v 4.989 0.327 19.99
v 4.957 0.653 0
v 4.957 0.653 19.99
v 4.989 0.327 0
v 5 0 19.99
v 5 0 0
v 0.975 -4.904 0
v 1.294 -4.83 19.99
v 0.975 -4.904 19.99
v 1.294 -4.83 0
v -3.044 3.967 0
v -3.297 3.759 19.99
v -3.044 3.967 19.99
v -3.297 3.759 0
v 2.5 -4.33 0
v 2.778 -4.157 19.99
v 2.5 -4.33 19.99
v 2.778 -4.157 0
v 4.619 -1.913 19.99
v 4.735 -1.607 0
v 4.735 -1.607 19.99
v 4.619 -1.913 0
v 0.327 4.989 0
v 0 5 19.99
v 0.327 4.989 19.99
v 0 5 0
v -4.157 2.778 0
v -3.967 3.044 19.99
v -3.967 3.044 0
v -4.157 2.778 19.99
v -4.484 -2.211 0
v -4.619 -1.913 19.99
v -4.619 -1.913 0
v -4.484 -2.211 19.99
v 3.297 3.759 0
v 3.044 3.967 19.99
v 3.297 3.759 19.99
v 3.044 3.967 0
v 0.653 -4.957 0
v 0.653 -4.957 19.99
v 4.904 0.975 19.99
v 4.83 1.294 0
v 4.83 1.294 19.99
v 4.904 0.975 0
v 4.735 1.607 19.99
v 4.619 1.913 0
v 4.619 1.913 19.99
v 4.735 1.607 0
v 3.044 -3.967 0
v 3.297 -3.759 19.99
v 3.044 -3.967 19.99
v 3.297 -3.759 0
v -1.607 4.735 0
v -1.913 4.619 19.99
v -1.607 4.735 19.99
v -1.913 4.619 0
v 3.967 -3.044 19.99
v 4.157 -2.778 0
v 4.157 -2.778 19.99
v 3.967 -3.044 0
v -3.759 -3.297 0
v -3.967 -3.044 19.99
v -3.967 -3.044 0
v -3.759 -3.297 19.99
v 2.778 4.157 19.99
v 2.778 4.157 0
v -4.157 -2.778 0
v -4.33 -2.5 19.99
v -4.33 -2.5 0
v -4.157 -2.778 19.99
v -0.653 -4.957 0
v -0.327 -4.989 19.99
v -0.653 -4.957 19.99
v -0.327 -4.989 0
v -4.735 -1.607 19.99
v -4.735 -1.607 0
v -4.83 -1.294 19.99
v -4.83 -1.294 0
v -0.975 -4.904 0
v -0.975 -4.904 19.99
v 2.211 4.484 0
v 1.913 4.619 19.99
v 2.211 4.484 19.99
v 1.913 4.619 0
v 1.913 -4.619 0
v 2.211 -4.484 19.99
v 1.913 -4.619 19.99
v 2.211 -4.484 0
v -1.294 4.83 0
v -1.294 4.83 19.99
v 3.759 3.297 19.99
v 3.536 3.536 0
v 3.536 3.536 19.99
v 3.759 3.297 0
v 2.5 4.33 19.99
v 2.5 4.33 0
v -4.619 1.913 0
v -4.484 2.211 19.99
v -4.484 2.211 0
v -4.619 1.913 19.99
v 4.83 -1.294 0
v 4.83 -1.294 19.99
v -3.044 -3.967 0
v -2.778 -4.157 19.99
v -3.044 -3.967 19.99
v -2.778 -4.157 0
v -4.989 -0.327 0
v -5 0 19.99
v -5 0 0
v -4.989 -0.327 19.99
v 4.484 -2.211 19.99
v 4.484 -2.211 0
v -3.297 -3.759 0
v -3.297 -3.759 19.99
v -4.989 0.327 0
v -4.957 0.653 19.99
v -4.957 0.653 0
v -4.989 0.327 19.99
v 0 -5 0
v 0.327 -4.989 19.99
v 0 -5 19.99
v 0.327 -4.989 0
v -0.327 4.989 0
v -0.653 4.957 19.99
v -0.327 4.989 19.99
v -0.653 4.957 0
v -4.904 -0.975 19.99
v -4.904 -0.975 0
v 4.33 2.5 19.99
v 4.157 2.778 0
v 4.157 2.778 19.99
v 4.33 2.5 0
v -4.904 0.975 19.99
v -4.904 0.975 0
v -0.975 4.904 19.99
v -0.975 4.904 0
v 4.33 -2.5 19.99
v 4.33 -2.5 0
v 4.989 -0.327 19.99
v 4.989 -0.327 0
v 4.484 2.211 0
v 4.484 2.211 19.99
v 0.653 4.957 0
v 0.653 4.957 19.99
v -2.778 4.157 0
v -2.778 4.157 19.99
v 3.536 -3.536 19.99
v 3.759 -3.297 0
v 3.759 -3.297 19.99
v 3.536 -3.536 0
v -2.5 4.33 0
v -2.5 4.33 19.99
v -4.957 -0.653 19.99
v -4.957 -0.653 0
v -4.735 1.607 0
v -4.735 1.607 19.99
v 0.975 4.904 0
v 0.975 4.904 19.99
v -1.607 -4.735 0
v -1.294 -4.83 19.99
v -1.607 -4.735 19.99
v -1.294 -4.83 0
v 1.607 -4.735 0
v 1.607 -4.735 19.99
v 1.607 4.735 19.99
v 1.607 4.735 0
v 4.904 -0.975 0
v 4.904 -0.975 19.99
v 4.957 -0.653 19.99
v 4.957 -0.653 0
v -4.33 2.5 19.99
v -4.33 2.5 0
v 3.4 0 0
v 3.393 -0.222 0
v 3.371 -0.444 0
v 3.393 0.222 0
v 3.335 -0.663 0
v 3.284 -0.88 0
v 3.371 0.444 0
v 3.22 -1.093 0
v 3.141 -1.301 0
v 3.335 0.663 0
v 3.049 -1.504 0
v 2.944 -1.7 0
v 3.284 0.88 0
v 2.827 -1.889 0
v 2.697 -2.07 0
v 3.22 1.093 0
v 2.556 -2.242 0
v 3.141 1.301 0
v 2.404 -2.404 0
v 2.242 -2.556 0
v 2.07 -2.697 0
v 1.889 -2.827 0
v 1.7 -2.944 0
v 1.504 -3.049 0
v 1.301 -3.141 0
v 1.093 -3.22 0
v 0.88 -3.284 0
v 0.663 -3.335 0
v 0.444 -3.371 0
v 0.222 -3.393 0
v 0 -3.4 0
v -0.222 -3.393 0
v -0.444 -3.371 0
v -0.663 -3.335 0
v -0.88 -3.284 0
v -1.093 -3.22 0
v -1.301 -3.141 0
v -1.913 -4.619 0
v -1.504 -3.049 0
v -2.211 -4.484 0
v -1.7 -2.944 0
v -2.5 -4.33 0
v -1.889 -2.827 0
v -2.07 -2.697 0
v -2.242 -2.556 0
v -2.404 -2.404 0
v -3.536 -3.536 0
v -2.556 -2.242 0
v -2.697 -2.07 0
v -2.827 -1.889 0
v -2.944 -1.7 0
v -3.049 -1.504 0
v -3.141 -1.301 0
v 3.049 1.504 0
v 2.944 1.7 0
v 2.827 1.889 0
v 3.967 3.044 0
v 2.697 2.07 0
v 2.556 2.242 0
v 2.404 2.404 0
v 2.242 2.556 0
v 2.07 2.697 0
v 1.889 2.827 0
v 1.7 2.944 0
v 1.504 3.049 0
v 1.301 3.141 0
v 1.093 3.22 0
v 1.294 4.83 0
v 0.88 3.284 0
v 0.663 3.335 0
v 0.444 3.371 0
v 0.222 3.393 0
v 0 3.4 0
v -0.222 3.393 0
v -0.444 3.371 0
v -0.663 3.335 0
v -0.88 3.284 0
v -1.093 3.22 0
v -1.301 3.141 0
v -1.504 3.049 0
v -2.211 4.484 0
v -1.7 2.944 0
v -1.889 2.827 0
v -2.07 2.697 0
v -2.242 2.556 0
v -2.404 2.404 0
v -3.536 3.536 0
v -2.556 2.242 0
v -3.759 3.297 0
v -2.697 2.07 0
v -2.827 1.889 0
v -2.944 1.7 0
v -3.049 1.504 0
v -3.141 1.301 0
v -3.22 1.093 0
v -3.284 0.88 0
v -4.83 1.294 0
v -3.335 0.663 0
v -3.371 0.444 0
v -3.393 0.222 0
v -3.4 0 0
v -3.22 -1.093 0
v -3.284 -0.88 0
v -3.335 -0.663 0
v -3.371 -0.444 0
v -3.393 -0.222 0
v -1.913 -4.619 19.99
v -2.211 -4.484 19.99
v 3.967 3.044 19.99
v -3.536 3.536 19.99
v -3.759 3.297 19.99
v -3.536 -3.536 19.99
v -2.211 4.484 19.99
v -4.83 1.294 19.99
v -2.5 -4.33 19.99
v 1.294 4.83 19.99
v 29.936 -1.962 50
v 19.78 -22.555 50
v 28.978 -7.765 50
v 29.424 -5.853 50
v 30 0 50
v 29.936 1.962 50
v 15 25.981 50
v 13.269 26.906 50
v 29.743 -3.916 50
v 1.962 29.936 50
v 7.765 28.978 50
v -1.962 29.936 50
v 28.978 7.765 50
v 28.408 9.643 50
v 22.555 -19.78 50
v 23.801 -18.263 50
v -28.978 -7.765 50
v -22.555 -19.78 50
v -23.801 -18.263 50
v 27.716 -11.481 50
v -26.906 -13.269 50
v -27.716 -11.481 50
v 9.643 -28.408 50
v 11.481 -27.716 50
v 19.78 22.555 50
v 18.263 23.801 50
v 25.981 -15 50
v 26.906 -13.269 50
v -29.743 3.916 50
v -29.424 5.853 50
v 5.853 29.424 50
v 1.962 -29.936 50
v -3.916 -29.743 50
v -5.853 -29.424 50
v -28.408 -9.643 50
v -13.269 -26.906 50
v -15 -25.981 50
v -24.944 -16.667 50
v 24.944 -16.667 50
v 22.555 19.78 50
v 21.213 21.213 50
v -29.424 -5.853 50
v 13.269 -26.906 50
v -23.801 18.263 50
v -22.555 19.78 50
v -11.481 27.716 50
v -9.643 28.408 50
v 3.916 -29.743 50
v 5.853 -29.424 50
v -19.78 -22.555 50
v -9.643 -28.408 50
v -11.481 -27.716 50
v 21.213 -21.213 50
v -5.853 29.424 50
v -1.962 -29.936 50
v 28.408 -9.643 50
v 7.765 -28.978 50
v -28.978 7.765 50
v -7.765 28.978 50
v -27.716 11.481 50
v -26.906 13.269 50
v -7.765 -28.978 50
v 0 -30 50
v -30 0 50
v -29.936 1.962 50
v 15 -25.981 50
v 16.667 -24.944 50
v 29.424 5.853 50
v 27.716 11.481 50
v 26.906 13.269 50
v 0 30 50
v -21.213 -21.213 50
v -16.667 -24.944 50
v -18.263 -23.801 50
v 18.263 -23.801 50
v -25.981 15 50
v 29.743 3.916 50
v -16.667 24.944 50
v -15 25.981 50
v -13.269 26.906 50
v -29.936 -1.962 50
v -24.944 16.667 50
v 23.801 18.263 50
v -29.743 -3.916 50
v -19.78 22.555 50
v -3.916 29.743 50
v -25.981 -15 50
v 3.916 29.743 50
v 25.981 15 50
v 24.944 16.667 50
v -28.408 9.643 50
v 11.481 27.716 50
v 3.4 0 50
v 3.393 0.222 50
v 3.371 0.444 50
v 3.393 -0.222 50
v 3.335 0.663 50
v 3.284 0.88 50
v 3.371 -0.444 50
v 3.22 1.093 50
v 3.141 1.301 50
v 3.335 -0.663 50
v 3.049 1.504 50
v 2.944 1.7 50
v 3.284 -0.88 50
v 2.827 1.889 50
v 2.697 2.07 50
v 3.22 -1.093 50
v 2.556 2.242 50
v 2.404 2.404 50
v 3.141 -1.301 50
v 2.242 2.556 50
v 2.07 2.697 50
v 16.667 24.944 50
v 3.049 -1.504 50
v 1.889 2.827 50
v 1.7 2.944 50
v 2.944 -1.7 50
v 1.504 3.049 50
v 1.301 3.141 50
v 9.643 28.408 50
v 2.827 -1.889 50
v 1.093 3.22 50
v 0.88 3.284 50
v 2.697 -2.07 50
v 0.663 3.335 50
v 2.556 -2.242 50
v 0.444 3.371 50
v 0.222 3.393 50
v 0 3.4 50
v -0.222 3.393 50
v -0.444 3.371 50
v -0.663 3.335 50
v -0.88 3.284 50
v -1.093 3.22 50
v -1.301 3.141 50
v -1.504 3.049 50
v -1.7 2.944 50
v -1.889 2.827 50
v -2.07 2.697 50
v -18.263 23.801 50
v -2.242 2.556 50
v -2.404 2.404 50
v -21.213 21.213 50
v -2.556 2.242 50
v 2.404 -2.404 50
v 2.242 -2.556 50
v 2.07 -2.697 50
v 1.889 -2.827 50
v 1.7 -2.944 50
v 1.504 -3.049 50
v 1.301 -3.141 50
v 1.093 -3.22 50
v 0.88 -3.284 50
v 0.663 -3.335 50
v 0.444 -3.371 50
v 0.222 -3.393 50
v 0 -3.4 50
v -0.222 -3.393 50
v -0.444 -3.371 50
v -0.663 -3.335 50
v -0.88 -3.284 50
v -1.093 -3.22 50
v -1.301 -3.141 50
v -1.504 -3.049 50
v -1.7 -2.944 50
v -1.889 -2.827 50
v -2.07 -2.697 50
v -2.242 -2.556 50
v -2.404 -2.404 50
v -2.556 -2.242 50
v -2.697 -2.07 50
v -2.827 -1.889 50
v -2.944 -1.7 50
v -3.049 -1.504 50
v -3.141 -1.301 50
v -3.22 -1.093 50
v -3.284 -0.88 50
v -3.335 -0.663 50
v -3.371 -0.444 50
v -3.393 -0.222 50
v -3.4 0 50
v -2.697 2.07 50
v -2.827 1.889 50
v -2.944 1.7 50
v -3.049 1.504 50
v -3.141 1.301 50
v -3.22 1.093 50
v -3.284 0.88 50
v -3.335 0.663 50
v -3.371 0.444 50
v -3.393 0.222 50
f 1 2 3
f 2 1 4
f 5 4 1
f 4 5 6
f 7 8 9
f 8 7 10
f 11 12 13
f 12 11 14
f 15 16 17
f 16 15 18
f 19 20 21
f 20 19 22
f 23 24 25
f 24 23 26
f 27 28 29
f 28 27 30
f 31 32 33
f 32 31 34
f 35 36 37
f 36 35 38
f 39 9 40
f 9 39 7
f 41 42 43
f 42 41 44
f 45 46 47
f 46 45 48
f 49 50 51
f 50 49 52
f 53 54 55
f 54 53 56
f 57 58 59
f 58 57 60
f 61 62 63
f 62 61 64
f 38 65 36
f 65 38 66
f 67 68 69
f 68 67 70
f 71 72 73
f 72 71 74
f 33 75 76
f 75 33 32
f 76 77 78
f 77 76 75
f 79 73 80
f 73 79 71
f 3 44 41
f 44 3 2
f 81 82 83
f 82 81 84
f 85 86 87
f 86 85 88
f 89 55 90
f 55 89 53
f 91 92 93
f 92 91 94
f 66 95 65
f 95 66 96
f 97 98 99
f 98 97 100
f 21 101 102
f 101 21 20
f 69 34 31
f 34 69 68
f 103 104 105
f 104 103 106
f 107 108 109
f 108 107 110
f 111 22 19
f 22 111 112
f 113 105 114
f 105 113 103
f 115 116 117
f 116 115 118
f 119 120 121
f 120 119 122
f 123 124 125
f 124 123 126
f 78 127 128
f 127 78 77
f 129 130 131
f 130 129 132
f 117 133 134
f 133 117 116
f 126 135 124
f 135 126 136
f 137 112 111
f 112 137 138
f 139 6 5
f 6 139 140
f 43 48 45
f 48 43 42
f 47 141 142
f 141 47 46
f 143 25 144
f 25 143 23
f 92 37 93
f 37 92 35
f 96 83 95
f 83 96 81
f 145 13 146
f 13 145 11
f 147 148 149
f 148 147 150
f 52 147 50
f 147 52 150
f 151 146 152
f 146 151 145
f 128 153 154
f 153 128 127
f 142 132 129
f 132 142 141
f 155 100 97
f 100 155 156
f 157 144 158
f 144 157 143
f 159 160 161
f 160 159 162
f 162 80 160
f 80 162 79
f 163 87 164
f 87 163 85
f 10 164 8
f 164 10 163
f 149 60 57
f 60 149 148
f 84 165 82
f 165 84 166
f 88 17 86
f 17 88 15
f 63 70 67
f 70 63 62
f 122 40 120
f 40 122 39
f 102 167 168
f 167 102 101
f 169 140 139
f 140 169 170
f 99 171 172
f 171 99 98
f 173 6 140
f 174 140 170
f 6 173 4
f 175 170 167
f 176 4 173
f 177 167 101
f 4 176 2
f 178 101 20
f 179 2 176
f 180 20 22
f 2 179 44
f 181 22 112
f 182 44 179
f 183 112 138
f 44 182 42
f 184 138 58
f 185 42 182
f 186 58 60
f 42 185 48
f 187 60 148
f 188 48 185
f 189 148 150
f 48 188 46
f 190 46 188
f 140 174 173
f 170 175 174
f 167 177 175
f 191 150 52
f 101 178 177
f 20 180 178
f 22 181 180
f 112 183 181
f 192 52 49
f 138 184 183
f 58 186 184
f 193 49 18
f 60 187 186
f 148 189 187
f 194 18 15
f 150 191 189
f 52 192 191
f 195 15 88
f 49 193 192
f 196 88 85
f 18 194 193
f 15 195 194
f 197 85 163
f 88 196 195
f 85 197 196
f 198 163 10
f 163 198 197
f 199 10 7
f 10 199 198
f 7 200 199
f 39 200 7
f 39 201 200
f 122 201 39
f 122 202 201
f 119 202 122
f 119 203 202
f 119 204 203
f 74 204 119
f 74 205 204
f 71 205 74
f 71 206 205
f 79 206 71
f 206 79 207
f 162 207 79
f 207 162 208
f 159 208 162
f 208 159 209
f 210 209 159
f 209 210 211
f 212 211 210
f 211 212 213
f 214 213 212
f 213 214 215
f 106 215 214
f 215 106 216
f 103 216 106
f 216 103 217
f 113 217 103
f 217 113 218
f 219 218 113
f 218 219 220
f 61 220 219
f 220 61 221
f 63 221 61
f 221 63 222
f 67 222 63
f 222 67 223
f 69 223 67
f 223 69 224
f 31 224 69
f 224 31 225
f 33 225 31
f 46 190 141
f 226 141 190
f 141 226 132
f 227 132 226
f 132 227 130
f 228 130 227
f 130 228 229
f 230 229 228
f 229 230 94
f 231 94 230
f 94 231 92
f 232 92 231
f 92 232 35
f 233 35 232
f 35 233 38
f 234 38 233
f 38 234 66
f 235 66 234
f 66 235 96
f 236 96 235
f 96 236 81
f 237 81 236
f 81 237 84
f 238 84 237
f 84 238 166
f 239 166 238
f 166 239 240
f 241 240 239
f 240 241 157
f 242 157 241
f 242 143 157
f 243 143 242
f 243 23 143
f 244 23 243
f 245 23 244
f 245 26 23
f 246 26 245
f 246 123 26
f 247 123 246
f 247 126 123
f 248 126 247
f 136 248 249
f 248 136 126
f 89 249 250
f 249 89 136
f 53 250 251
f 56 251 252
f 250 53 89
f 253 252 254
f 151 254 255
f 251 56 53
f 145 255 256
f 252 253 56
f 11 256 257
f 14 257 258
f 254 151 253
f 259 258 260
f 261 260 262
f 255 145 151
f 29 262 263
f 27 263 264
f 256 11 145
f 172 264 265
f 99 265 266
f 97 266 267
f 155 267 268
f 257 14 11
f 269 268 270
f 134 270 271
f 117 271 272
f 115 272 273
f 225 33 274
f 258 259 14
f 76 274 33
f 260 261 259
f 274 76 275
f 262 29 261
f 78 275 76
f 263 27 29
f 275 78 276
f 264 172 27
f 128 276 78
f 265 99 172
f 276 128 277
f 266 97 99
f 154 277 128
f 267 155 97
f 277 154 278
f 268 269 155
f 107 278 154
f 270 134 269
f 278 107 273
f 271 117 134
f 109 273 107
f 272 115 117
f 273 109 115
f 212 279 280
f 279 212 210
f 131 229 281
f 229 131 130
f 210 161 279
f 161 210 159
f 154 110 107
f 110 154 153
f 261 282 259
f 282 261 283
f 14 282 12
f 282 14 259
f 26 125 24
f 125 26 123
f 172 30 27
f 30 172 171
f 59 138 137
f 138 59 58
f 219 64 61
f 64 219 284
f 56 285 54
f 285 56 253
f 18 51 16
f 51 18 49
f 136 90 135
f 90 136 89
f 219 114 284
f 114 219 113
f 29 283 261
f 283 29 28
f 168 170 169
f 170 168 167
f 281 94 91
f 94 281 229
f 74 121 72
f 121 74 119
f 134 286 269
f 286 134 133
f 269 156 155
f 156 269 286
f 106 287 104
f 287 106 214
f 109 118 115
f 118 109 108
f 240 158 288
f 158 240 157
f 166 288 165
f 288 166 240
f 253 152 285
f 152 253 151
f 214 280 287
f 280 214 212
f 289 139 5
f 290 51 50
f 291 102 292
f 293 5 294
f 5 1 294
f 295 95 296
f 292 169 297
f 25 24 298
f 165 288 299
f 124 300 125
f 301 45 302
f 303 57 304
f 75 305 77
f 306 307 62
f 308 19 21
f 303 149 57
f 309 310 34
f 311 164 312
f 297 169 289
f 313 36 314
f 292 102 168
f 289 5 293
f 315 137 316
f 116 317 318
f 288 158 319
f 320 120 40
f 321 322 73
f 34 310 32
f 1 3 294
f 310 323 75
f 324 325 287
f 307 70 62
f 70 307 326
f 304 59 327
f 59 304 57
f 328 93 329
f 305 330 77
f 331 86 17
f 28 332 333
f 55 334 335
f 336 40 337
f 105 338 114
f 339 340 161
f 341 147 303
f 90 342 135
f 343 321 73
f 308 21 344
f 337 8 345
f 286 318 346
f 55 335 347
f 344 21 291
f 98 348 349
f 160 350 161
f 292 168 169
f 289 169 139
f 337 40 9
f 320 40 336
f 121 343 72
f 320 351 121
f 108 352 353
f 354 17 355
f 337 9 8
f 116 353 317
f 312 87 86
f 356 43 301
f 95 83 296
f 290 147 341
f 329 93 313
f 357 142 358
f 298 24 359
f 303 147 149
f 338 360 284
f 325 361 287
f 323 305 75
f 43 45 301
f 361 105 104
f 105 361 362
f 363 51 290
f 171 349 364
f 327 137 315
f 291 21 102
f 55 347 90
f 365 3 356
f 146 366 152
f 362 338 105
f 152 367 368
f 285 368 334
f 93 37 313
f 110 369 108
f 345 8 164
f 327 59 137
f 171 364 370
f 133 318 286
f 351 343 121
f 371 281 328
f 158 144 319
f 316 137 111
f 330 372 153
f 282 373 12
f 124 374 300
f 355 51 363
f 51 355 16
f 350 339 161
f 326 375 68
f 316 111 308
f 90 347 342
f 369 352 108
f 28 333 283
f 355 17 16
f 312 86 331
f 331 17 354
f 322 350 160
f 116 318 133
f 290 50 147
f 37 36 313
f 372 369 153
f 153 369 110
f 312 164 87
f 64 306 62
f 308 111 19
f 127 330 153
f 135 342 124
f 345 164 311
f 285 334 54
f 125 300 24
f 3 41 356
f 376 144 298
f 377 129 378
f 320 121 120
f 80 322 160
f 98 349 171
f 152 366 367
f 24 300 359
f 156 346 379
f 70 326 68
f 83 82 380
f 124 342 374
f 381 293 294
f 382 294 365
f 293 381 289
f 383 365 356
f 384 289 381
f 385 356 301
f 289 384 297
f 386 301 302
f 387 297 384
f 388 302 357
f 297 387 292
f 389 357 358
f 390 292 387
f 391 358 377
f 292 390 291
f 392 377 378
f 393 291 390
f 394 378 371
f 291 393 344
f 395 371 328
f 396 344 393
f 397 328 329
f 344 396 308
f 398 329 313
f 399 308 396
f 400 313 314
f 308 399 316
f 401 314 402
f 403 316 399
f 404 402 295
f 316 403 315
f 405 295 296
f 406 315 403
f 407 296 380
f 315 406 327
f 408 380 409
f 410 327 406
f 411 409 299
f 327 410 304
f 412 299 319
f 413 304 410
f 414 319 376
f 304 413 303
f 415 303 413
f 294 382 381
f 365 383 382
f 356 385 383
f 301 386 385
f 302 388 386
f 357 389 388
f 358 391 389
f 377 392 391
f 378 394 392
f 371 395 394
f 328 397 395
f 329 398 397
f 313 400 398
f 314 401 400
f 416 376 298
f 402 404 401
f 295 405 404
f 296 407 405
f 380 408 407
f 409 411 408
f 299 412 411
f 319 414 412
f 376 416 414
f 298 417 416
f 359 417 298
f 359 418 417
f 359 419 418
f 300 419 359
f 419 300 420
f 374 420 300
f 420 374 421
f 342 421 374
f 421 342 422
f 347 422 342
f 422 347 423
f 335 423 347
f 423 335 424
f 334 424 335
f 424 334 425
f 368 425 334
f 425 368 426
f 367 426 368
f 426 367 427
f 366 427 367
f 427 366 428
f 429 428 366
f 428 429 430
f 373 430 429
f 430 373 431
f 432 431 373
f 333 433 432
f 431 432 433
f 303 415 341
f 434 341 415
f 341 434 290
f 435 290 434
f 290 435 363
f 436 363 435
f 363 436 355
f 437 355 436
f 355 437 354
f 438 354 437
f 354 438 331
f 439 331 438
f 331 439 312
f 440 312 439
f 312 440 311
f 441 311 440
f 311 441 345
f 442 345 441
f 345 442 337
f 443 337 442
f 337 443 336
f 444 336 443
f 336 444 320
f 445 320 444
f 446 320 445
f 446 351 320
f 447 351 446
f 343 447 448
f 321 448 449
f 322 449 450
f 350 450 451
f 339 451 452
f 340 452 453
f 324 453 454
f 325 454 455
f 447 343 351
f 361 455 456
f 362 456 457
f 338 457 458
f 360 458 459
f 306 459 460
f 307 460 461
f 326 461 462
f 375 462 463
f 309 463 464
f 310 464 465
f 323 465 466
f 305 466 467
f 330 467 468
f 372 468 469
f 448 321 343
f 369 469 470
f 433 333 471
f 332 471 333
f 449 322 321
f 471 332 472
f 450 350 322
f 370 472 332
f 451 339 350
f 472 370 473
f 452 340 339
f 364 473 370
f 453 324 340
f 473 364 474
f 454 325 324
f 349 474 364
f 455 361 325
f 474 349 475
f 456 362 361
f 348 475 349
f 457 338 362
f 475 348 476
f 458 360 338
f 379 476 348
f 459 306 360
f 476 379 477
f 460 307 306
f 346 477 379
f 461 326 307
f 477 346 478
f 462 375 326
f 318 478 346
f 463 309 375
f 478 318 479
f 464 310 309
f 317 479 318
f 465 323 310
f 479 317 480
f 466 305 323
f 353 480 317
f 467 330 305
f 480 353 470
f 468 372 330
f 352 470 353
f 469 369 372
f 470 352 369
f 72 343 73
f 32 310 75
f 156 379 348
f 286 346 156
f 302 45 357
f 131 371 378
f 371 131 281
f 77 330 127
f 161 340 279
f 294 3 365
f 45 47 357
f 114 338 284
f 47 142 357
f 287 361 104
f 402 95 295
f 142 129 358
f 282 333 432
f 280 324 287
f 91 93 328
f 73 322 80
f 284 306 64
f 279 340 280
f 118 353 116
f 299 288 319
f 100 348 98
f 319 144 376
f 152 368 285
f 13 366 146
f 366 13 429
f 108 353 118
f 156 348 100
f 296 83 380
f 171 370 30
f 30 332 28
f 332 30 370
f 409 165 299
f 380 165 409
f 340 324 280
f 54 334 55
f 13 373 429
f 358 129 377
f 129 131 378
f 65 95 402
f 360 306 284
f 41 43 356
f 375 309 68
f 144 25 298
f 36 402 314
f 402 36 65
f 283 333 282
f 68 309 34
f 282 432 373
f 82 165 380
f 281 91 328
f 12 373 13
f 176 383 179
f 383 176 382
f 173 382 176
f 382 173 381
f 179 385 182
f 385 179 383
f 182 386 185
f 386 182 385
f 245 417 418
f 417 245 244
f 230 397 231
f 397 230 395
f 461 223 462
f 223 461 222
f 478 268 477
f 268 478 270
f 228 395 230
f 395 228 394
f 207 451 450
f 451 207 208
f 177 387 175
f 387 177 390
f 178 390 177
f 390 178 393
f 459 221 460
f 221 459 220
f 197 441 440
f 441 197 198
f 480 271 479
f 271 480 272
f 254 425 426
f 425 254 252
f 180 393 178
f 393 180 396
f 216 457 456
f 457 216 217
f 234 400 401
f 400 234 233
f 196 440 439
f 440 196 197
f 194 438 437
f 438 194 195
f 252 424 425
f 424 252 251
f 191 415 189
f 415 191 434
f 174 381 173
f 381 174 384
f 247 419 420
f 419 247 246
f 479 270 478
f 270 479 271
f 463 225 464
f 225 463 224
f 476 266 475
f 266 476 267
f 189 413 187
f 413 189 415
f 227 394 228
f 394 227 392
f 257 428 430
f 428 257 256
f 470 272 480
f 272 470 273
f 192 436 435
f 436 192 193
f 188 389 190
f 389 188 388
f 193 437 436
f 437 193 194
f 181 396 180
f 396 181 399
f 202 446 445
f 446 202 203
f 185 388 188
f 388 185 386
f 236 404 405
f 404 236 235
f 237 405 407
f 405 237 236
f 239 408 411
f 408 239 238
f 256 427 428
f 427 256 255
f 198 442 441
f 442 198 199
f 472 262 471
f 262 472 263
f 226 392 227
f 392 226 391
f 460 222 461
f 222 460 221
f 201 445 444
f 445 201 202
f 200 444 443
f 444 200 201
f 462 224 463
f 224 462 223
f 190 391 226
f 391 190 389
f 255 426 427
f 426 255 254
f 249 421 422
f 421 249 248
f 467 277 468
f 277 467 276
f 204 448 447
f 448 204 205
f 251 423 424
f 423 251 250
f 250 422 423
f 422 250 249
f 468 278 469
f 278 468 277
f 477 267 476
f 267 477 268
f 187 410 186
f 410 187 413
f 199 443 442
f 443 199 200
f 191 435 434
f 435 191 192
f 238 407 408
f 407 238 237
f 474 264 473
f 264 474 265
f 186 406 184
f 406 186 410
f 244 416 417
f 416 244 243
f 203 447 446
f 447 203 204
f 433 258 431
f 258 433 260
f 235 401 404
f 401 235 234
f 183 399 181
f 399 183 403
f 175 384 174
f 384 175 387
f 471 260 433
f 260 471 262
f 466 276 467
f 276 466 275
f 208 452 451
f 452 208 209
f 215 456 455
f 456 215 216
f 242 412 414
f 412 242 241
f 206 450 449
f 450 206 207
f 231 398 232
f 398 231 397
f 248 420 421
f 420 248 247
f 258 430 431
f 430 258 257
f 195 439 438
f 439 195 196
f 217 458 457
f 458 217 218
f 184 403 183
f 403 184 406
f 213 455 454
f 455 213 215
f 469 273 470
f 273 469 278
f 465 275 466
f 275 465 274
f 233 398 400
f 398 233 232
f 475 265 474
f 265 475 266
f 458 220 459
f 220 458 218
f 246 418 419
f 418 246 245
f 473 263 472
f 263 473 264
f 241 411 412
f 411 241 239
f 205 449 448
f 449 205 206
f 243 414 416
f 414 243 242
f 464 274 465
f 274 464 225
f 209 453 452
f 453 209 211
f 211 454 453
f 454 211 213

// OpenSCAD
// Small lab funnel, printed upright with wide opening at top
// Units: mm

// ---- Dimensions ----
spout_od      = 10;    // spout outer diameter
spout_id      = spout_od - 2 * 1.6;  // spout bore (6.8 mm)
spout_h       = 20;    // spout length (z = 0 to 20)
cone_top_od   = 60;    // funnel rim outer diameter (z = 50)
cone_bottom_od = spout_od; // cone starts at spout diameter (z = 20)
cone_h        = 30;    // cone height (z = 20 to 50)
wall          = 1.6;   // uniform wall thickness
eps           = 0.5;   // cutter overshoot past faces

$fn = 96;

// ---- Model ----
difference() {
    union() {
        // Spout tube
        cylinder(d = spout_od, h = spout_h);
        // Cone (slightly overlapping spout for a clean union)
        translate([0, 0, spout_h - 0.01])
            cylinder(d1 = cone_bottom_od, d2 = cone_top_od, h = cone_h + 0.01);
    }
    // Through-bore: spout bore extended up through the cone rim
    translate([0, 0, -eps])
        cylinder(d = spout_id, h = spout_h + cone_h + 2 * eps);
}
